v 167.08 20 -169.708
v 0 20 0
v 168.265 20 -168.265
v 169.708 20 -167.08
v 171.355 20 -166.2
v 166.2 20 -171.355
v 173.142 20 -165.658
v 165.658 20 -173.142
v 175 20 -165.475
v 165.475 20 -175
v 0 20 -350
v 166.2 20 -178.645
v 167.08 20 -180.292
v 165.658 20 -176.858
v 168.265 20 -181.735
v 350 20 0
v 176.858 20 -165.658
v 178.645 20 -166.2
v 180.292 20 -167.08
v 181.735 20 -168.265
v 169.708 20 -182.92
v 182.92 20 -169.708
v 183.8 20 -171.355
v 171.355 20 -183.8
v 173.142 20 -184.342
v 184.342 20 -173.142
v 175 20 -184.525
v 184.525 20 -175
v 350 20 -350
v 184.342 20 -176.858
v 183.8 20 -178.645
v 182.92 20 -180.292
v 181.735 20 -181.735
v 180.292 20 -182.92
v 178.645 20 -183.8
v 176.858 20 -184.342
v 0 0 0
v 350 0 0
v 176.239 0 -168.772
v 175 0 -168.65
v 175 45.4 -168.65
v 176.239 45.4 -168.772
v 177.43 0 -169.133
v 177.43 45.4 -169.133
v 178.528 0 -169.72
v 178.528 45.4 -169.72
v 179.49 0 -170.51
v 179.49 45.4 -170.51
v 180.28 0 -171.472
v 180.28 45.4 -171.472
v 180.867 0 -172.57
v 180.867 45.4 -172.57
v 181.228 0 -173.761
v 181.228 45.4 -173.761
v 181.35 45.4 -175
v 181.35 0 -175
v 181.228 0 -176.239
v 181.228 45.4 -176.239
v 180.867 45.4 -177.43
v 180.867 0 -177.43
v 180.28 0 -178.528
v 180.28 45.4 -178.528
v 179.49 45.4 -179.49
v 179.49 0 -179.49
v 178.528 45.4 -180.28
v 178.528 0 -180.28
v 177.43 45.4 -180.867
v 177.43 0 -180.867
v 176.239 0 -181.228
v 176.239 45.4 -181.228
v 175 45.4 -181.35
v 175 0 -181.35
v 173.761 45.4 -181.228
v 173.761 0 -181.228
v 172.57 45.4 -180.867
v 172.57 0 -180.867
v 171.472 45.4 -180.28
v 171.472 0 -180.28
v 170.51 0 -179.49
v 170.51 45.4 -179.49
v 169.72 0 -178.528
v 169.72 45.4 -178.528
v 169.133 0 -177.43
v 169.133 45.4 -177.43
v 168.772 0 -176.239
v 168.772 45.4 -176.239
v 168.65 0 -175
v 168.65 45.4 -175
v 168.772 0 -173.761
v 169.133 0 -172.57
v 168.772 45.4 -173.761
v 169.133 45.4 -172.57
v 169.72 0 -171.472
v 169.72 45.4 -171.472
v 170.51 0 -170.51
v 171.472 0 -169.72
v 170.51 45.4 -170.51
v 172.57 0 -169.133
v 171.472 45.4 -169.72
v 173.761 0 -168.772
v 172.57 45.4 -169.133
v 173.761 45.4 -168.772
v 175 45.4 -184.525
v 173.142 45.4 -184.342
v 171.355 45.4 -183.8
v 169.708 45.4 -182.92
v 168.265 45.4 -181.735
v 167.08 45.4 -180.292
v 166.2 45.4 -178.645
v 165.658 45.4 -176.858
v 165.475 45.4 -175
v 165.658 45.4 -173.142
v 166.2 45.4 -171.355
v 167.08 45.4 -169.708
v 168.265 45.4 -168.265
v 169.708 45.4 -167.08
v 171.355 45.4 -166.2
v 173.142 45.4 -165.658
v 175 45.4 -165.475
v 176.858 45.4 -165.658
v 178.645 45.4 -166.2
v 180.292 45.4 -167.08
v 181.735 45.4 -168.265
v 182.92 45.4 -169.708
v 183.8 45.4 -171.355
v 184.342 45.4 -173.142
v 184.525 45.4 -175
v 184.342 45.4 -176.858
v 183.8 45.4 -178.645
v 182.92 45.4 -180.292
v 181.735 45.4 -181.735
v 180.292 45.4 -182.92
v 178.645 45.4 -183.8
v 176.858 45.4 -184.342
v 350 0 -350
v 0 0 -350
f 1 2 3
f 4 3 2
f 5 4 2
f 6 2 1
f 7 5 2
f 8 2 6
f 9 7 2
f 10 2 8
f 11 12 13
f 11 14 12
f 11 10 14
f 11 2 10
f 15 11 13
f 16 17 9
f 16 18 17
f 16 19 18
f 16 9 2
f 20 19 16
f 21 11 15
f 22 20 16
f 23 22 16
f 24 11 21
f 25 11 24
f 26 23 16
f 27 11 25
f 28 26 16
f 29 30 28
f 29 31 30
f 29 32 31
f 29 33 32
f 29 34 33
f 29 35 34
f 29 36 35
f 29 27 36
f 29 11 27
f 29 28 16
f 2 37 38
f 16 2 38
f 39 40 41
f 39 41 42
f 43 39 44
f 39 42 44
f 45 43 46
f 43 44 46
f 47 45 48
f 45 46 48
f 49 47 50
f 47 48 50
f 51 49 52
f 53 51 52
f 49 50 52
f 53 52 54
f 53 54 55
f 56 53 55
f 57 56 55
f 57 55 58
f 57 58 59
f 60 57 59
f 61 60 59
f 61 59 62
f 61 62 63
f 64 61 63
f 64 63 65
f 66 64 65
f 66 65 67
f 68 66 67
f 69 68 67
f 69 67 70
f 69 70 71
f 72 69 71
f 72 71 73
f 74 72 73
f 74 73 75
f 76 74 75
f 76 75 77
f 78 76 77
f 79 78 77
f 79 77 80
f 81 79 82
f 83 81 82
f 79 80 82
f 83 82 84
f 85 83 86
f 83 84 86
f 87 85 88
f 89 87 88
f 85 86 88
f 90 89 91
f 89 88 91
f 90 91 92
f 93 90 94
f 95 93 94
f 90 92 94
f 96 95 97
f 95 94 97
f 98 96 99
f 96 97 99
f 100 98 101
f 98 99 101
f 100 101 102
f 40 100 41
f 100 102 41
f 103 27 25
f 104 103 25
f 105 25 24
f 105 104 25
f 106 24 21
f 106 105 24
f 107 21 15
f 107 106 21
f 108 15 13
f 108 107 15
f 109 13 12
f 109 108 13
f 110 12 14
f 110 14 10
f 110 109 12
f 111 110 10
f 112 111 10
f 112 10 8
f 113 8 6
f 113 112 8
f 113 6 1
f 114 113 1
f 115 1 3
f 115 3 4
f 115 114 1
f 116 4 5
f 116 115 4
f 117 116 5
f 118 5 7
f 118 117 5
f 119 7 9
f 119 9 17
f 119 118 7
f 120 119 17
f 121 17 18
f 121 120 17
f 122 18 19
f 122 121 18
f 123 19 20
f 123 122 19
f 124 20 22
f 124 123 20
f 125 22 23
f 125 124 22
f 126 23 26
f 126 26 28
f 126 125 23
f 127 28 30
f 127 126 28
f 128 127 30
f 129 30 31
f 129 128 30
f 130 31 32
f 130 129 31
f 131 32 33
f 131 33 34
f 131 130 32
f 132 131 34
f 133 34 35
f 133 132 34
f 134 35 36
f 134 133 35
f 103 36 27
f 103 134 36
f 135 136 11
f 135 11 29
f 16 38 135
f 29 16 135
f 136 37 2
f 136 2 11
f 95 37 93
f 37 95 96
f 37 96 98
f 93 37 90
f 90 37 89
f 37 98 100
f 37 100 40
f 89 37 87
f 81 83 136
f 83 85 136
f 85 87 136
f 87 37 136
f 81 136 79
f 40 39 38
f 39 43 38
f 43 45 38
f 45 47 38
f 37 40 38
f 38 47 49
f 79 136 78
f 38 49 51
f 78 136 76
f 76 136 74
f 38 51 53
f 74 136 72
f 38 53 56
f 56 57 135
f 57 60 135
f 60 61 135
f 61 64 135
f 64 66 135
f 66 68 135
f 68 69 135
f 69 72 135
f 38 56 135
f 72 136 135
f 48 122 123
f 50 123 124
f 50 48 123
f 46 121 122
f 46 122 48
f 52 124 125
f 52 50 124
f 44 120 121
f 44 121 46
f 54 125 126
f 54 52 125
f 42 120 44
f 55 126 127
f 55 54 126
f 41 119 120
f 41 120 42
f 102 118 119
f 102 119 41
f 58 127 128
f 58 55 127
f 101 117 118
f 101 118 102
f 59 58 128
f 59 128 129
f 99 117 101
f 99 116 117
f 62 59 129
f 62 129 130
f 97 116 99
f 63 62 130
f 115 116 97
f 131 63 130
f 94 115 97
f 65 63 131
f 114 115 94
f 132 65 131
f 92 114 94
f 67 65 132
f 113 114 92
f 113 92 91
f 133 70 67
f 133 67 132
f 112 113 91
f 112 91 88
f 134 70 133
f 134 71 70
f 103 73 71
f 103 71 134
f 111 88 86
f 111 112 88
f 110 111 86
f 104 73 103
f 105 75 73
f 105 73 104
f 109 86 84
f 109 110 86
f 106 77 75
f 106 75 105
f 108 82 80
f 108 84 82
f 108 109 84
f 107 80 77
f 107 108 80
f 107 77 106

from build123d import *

# Parameters (mm, degrees)
SKETCH2_W           = 350
SKETCH2_H           = 350
BOSS_EXTRUDE1_DEPTH = 20
SKETCH3_R           = 6.35
CUT_EXTRUDE1_DEPTH  = 496.37864306
BOSS_EXTRUDE2_START = 25.4
SKETCH3_3_R         = 9.525
SKETCH3_3_R_2       = 6.35
BOSS_EXTRUDE2_DEPTH = 25.4


with BuildPart() as part:
    # Sketch2 → Boss-Extrude1 (new body)
    with BuildSketch(Plane(origin=(0, 0, 0), x_dir=(1, 0, 0), z_dir=(0, 1, 0))):
        with Locations((175, 175)):
            Rectangle(SKETCH2_W, SKETCH2_H)
    extrude(amount=BOSS_EXTRUDE1_DEPTH)

    # Sketch3 → Cut-Extrude1 (cut, through all)
    with BuildSketch(Plane(origin=(0, 20, 0), x_dir=(1, 0, 0), z_dir=(0, 1, 0))):
        with Locations((175, 175)):
            Circle(SKETCH3_R)
    extrude(amount=-CUT_EXTRUDE1_DEPTH, mode=Mode.SUBTRACT)

    # Sketch3<3> → Boss-Extrude2 (add)
    with BuildSketch(Plane(origin=(0, 20, 0), x_dir=(1, 0, 0), z_dir=(0, 1, 0)).offset(BOSS_EXTRUDE2_START)):
        with Locations((175, 175)):
            Circle(SKETCH3_3_R)
        with Locations((175, 175)):
            Circle(SKETCH3_3_R_2, mode=Mode.SUBTRACT)
    extrude(amount=-BOSS_EXTRUDE2_DEPTH)


solid = part.part
